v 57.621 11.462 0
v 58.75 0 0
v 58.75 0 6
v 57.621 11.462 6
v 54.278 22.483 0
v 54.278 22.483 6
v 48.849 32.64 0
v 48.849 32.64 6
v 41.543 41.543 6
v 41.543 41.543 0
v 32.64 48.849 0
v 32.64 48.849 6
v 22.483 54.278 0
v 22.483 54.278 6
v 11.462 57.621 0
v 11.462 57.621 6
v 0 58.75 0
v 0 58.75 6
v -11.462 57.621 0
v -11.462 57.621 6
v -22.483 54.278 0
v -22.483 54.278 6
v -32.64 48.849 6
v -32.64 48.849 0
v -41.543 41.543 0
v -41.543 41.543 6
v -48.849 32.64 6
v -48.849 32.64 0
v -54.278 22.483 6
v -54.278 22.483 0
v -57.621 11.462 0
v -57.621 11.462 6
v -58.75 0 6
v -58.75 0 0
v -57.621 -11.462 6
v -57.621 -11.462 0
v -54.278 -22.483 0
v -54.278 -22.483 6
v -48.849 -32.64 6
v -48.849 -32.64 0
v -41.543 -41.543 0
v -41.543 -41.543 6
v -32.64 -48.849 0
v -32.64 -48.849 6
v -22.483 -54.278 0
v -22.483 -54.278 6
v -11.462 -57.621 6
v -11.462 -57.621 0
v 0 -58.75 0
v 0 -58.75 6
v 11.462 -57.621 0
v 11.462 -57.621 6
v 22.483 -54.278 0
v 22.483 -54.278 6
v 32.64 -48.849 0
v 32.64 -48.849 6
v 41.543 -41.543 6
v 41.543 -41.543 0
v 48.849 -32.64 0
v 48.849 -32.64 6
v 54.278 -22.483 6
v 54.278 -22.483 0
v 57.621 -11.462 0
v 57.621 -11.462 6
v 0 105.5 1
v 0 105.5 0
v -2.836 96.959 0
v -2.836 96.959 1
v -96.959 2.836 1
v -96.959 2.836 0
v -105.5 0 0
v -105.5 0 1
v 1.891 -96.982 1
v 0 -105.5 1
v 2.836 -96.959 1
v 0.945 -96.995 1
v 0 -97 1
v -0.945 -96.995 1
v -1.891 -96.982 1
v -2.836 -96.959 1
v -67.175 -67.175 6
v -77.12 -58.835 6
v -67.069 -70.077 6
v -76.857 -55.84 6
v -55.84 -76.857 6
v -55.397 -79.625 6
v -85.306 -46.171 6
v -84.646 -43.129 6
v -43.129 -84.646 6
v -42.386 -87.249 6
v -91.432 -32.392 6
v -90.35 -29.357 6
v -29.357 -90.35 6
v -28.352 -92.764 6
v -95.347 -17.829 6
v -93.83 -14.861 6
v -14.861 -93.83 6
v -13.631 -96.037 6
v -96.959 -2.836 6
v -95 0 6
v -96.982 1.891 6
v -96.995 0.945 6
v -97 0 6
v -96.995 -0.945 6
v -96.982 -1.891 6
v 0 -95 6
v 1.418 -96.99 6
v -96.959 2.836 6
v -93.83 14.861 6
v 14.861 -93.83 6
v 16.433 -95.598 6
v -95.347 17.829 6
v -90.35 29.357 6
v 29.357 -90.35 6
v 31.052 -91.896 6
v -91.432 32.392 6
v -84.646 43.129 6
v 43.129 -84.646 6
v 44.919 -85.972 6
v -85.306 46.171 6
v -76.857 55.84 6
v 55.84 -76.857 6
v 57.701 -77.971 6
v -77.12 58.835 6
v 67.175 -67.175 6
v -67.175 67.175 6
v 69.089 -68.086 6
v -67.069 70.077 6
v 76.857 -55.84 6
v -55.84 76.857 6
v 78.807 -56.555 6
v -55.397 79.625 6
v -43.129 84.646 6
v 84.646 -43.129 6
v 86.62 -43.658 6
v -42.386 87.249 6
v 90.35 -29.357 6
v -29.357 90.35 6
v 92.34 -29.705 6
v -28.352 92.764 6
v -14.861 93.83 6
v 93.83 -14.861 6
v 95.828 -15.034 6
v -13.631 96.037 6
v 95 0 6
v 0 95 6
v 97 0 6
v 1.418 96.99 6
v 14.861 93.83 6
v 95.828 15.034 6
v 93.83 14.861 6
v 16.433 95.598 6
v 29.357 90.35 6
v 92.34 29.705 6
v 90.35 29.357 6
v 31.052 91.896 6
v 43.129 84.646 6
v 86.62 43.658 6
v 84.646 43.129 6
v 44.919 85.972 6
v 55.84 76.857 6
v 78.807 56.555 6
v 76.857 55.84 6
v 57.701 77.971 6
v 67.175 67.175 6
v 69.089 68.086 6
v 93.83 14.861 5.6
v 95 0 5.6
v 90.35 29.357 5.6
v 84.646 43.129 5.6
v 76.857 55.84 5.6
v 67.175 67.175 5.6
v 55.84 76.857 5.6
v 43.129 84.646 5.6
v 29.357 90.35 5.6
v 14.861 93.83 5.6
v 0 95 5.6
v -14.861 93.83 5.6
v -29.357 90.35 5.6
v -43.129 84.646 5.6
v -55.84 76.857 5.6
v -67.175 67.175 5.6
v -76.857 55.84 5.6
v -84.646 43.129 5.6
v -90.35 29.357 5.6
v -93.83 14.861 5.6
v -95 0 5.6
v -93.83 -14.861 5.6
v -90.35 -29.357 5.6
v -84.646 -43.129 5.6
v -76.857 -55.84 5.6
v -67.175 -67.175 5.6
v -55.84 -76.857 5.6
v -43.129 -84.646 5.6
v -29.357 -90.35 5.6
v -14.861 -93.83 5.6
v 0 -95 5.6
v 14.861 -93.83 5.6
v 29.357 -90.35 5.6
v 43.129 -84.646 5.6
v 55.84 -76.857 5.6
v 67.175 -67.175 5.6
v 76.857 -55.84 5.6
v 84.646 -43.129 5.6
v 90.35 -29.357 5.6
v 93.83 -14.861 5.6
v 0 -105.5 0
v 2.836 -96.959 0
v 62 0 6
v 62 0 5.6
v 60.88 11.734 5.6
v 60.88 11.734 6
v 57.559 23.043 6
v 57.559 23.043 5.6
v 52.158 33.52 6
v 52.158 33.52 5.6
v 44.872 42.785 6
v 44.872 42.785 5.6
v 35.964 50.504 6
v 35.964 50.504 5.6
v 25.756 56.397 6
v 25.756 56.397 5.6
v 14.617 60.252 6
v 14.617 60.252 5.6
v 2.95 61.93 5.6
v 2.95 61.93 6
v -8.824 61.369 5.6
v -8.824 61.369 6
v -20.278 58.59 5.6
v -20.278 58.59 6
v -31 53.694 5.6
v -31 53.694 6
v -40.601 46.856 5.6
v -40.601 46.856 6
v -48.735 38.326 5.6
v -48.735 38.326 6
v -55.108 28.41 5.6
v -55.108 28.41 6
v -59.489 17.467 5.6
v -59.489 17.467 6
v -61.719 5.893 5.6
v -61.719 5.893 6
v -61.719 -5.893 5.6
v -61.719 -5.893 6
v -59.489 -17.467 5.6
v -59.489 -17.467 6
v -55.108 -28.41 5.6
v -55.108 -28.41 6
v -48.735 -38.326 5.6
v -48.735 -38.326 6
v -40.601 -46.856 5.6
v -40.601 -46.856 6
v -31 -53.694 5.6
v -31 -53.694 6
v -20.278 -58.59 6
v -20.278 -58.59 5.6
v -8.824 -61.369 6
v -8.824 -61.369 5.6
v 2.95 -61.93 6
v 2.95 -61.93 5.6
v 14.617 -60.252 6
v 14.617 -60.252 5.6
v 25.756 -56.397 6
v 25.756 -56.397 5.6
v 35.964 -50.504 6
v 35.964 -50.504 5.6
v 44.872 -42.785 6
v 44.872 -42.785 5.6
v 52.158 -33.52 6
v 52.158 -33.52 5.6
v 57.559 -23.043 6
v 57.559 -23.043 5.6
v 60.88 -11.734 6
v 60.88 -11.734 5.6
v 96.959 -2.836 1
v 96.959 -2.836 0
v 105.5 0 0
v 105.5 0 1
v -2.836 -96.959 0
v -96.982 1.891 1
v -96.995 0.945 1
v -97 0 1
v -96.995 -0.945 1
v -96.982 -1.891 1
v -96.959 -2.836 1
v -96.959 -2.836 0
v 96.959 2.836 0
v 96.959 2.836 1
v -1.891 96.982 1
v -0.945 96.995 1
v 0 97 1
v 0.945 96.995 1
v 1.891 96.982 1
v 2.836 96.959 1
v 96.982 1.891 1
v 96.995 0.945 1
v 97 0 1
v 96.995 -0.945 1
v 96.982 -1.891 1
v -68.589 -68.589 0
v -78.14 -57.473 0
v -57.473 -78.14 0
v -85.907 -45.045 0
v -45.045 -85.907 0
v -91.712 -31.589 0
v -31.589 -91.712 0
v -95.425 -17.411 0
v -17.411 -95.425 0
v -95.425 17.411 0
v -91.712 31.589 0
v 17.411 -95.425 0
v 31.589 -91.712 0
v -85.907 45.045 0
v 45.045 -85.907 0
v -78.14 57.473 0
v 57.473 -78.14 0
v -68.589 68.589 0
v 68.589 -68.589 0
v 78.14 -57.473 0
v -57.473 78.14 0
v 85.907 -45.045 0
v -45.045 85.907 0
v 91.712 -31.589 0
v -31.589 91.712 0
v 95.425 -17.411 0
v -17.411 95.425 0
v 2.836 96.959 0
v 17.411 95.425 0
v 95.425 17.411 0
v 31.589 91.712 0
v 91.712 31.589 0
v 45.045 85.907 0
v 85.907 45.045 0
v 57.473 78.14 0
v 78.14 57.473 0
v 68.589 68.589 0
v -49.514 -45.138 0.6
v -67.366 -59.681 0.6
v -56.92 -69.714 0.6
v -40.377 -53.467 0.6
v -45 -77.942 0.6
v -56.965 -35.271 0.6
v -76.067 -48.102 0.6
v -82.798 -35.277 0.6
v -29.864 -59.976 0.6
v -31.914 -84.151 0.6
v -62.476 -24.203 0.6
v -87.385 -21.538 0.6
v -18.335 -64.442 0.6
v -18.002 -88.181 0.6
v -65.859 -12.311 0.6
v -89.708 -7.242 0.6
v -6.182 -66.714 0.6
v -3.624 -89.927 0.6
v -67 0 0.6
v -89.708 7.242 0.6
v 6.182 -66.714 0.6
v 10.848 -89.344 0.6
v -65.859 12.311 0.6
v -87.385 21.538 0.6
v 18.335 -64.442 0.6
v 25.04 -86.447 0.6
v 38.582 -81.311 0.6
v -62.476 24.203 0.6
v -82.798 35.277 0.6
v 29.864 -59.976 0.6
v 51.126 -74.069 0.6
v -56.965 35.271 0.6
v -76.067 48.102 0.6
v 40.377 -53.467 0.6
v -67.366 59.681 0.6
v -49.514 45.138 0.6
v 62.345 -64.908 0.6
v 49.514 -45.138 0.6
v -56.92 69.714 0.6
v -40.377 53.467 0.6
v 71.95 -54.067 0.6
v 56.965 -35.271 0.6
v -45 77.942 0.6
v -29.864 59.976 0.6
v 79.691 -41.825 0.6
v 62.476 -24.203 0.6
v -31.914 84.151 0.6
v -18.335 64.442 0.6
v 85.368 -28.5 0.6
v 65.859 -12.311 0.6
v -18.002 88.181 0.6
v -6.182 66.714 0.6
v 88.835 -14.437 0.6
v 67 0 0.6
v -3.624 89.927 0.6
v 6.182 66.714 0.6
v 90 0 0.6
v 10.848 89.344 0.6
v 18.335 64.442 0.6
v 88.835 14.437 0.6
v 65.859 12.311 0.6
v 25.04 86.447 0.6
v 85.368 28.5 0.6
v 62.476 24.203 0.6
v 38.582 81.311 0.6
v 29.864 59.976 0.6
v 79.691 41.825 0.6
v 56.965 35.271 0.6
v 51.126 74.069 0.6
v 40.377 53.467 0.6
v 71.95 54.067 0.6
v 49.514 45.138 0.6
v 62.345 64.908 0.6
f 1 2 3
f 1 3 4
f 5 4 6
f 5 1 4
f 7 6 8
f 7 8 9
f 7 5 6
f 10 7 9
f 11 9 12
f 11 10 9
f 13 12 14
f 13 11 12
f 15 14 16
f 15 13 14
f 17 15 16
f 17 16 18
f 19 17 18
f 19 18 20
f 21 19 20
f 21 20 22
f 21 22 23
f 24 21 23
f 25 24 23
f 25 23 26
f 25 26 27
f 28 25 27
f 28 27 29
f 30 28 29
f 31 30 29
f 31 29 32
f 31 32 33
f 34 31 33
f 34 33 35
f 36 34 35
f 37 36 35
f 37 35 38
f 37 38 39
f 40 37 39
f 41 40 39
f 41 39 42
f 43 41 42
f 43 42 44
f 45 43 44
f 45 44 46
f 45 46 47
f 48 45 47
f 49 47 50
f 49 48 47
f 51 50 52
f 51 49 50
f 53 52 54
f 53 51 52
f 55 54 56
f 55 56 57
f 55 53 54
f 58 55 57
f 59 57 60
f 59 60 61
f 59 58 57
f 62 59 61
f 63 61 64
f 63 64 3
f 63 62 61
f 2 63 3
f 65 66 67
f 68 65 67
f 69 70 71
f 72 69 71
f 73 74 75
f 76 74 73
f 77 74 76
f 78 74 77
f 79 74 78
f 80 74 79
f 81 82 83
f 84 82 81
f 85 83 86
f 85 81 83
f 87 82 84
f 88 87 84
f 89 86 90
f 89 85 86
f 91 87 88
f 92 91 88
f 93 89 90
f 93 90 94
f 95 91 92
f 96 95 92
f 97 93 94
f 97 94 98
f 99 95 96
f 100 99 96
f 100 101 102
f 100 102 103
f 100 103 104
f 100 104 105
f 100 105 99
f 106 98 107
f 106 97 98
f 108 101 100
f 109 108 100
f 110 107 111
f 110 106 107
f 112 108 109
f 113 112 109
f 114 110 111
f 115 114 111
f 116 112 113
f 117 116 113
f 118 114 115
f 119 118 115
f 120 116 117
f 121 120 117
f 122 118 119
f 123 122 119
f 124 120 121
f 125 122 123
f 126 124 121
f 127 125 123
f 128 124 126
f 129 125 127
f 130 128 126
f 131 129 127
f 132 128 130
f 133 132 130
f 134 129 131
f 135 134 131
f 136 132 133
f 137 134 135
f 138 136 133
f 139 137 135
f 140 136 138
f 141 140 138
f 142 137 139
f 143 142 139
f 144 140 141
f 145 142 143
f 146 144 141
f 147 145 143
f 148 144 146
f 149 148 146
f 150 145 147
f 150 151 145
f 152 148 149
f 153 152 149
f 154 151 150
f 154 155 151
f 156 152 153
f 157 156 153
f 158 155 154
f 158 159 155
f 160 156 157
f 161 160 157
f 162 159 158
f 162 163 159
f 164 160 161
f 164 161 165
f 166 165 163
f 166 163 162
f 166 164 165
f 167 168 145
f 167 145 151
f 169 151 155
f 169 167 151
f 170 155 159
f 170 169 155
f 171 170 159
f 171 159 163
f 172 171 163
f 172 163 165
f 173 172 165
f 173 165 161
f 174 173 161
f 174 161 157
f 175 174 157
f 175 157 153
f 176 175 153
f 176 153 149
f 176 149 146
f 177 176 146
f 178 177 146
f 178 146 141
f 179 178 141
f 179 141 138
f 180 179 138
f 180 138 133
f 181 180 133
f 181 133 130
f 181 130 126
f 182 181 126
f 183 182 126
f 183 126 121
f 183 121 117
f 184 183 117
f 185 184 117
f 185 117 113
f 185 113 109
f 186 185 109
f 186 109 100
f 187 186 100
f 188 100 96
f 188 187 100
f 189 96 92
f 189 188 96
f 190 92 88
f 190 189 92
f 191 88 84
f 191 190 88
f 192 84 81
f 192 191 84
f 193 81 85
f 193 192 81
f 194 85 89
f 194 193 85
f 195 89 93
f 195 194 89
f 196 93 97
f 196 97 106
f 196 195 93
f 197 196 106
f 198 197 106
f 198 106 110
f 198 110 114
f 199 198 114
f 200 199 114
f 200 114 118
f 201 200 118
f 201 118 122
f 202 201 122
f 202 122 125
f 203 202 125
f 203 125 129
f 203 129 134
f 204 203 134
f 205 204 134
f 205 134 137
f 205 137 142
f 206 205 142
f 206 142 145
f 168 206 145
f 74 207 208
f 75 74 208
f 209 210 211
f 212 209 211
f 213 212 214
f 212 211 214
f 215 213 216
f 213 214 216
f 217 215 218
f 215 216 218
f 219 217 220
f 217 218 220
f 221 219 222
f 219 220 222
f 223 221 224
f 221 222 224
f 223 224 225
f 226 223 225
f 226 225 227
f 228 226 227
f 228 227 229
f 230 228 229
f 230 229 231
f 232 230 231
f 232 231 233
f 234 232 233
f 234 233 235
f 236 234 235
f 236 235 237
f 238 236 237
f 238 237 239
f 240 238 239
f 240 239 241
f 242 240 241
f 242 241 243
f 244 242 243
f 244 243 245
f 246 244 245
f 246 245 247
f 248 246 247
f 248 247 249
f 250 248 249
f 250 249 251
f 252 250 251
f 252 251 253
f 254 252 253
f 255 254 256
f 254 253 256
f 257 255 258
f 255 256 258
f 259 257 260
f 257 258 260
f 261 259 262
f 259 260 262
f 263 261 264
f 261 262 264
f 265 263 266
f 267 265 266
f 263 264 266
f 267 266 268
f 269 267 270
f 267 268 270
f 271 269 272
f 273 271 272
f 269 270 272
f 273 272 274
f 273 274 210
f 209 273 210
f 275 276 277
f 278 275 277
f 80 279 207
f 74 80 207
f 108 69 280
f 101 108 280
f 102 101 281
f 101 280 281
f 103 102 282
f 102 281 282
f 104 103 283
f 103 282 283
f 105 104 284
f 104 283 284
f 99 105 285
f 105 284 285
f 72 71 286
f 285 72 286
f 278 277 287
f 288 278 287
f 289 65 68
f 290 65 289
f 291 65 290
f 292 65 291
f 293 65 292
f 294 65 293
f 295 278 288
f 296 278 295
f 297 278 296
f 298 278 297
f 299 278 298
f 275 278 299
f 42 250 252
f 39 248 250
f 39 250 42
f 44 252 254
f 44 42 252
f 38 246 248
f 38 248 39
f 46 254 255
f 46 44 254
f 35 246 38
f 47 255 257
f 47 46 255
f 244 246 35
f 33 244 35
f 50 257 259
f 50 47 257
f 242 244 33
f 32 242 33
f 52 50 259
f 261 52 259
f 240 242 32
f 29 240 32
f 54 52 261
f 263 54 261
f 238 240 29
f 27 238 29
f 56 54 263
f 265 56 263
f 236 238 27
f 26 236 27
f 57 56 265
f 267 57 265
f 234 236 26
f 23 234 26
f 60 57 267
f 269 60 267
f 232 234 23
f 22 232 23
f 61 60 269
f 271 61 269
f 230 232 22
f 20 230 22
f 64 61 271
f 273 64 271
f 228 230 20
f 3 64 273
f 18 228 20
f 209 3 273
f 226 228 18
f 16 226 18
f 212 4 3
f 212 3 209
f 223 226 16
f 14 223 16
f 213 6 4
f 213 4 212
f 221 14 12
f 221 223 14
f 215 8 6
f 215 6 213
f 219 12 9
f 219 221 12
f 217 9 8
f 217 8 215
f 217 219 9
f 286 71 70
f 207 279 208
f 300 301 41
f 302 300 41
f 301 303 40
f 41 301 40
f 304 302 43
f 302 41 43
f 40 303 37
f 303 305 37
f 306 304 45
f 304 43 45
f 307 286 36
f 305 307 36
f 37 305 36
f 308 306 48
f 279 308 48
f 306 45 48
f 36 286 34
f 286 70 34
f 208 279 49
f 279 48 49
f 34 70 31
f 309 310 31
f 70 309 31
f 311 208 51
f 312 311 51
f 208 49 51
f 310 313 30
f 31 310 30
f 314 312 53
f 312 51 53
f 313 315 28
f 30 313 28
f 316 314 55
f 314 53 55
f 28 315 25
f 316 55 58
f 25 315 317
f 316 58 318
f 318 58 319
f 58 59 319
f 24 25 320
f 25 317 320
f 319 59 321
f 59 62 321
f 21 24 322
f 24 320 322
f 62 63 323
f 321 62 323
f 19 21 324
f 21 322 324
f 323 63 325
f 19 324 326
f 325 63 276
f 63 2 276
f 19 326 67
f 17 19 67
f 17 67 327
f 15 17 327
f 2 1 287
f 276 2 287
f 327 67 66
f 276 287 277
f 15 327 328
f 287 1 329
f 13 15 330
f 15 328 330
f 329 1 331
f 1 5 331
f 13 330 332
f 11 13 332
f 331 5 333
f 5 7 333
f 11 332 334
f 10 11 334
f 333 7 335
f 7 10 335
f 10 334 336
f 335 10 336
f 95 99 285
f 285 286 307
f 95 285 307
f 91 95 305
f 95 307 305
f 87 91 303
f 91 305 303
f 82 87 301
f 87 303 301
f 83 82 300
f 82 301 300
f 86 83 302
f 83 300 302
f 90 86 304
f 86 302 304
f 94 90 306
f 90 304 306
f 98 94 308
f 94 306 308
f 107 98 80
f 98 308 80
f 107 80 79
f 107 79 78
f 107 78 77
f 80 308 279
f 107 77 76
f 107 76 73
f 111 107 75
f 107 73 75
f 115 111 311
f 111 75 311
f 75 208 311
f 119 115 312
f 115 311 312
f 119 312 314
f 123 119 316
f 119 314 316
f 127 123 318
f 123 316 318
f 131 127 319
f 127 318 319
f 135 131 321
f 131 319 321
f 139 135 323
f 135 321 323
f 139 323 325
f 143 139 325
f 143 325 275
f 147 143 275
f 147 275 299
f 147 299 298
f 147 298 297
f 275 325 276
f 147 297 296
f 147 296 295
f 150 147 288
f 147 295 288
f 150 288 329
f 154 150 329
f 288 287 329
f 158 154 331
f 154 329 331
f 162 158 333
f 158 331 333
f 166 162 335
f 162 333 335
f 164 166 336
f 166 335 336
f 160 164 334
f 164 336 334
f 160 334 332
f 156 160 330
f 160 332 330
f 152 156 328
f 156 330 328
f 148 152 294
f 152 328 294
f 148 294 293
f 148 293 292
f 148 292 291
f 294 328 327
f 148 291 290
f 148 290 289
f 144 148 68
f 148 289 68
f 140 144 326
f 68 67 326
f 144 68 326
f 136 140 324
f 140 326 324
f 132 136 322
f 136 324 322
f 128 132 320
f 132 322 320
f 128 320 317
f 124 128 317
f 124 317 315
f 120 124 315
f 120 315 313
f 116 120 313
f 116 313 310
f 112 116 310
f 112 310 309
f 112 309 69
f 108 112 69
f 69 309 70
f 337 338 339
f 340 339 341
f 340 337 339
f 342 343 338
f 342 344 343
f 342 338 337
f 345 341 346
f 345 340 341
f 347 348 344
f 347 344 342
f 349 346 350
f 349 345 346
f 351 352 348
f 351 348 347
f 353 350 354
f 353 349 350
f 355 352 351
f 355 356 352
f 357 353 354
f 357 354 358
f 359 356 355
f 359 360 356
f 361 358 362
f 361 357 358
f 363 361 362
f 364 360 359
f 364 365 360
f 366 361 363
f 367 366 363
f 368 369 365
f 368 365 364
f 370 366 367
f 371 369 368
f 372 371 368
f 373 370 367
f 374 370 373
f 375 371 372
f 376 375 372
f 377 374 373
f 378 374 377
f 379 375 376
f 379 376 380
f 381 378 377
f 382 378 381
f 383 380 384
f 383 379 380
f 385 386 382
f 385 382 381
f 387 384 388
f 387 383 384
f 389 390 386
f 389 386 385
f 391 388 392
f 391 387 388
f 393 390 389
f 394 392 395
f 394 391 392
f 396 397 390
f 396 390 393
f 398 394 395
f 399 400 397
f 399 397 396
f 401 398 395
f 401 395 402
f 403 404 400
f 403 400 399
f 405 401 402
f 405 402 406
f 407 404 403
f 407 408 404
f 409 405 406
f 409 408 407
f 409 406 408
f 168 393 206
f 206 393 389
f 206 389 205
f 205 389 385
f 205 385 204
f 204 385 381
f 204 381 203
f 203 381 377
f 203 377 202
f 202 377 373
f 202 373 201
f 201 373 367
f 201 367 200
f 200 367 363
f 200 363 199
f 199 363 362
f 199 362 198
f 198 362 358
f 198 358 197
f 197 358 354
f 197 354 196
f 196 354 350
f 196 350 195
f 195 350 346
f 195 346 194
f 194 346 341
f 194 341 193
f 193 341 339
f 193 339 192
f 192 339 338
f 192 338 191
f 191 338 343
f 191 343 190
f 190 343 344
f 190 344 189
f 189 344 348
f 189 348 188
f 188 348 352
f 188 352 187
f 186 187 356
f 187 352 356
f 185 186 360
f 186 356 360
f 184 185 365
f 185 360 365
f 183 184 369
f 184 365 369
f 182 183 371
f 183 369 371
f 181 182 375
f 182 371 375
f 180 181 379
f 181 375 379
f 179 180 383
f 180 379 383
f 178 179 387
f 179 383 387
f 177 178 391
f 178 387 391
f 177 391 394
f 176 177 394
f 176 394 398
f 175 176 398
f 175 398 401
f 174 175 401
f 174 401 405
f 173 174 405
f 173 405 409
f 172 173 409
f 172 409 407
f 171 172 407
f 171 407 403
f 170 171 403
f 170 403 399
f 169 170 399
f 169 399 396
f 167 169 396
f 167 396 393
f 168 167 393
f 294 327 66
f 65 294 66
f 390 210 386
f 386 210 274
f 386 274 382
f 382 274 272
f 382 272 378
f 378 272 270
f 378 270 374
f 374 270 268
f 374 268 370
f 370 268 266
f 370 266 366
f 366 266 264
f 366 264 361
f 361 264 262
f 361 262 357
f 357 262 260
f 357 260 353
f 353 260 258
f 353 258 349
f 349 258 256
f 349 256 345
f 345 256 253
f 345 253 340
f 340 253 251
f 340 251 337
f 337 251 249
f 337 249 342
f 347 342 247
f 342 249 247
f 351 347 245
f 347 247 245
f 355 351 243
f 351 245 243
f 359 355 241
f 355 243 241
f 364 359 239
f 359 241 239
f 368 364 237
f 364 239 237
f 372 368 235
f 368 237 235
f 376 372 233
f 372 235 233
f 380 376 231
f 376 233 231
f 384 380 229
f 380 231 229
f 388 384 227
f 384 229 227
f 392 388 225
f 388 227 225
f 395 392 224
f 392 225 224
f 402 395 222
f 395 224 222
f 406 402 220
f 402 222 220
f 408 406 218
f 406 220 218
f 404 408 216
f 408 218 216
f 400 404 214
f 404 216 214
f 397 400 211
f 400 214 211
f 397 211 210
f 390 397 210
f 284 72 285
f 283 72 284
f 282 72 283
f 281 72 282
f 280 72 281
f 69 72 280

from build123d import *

# Parameters (mm, degrees)
F0_R            = 95
F0_R_2          = 62
F0_R_3          = 58.75
F1_DEPTH        = 0.6
F2_DEPTH        = 6
F3_DEPTH        = 1
F3_COPIES_COUNT = 4
F4_SIZE         = 5


# Not quite as in the source:
# - a pattern or mirror of a feature is missing from the dataset's text; its kind, count and spacing are read off the source's solid


with BuildPart() as f1:
    # F0 (on Top) → F1 (new body)
    with BuildSketch(Plane.XY):
        with BuildLine():
            ThreePointArc((-96.9585308057, -2.8360719318), (1.418187549, -96.9896321473), (97, 0))
            ThreePointArc((97, 0), (1.418187549, 96.9896321473), (-96.9585308057, 2.8360719318))
            ThreePointArc((-96.9585308057, 2.8360719318), (-96.9896321473, 1.418187549), (-97, 0))
            ThreePointArc((-97, 0), (-96.9896321473, -1.418187549), (-96.9585308057, -2.8360719318))
        make_face()
        Circle(F0_R, mode=Mode.SUBTRACT)
        Circle(F0_R)
        Circle(F0_R_2, mode=Mode.SUBTRACT)
        Circle(F0_R_2)
        Circle(F0_R_3, mode=Mode.SUBTRACT)
    extrude(amount=F1_DEPTH)

    # F0 (on Top) → F2 (join)
    with BuildSketch(Plane.XY):
        with BuildLine():
            ThreePointArc((-96.9585308057, -2.8360719318), (1.418187549, -96.9896321473), (97, 0))
            ThreePointArc((97, 0), (1.418187549, 96.9896321473), (-96.9585308057, 2.8360719318))
            ThreePointArc((-96.9585308057, 2.8360719318), (-96.9896321473, 1.418187549), (-97, 0))
            ThreePointArc((-97, 0), (-96.9896321473, -1.418187549), (-96.9585308057, -2.8360719318))
        make_face()
        Circle(F0_R, mode=Mode.SUBTRACT)
        Circle(F0_R_2)
        Circle(F0_R_3, mode=Mode.SUBTRACT)
    extrude(amount=F2_DEPTH)

    # F0 (on Top) → F3 (join)
    with BuildSketch(Plane.XY):
        with BuildLine():
            ThreePointArc((-97, 0), (-96.9896321473, 1.418187549), (-96.9585308057, 2.8360719318))
            Line((-96.9585308057, 2.8360719318), (-105.5, 0))
            Line((-105.5, 0), (-97, 0))
        make_face()
        with BuildLine():
            Line((-105.5, 0), (-96.9585308057, -2.8360719318))
            ThreePointArc((-96.9585308057, -2.8360719318), (-96.9896321473, -1.418187549), (-97, 0))
            Line((-97, 0), (-105.5, 0))
        make_face()
    f3 = extrude(amount=F3_DEPTH)

    # F3_copies: F3 ×4 about axis
    f3_copies_axis = Axis((0, 0, 0), (0, 0, 1))
    for i in range(1, F3_COPIES_COUNT):
        add(f3.rotate(f3_copies_axis, i * 360 / F3_COPIES_COUNT))

    # F4
    f4_edges = [f1.edges().sort_by_distance(p)[0] for p in [
        (-62, 0, 0.6),
        (-95, 0, 0.6),
    ]]
    chamfer(f4_edges, length=F4_SIZE)


solid = f1.part
